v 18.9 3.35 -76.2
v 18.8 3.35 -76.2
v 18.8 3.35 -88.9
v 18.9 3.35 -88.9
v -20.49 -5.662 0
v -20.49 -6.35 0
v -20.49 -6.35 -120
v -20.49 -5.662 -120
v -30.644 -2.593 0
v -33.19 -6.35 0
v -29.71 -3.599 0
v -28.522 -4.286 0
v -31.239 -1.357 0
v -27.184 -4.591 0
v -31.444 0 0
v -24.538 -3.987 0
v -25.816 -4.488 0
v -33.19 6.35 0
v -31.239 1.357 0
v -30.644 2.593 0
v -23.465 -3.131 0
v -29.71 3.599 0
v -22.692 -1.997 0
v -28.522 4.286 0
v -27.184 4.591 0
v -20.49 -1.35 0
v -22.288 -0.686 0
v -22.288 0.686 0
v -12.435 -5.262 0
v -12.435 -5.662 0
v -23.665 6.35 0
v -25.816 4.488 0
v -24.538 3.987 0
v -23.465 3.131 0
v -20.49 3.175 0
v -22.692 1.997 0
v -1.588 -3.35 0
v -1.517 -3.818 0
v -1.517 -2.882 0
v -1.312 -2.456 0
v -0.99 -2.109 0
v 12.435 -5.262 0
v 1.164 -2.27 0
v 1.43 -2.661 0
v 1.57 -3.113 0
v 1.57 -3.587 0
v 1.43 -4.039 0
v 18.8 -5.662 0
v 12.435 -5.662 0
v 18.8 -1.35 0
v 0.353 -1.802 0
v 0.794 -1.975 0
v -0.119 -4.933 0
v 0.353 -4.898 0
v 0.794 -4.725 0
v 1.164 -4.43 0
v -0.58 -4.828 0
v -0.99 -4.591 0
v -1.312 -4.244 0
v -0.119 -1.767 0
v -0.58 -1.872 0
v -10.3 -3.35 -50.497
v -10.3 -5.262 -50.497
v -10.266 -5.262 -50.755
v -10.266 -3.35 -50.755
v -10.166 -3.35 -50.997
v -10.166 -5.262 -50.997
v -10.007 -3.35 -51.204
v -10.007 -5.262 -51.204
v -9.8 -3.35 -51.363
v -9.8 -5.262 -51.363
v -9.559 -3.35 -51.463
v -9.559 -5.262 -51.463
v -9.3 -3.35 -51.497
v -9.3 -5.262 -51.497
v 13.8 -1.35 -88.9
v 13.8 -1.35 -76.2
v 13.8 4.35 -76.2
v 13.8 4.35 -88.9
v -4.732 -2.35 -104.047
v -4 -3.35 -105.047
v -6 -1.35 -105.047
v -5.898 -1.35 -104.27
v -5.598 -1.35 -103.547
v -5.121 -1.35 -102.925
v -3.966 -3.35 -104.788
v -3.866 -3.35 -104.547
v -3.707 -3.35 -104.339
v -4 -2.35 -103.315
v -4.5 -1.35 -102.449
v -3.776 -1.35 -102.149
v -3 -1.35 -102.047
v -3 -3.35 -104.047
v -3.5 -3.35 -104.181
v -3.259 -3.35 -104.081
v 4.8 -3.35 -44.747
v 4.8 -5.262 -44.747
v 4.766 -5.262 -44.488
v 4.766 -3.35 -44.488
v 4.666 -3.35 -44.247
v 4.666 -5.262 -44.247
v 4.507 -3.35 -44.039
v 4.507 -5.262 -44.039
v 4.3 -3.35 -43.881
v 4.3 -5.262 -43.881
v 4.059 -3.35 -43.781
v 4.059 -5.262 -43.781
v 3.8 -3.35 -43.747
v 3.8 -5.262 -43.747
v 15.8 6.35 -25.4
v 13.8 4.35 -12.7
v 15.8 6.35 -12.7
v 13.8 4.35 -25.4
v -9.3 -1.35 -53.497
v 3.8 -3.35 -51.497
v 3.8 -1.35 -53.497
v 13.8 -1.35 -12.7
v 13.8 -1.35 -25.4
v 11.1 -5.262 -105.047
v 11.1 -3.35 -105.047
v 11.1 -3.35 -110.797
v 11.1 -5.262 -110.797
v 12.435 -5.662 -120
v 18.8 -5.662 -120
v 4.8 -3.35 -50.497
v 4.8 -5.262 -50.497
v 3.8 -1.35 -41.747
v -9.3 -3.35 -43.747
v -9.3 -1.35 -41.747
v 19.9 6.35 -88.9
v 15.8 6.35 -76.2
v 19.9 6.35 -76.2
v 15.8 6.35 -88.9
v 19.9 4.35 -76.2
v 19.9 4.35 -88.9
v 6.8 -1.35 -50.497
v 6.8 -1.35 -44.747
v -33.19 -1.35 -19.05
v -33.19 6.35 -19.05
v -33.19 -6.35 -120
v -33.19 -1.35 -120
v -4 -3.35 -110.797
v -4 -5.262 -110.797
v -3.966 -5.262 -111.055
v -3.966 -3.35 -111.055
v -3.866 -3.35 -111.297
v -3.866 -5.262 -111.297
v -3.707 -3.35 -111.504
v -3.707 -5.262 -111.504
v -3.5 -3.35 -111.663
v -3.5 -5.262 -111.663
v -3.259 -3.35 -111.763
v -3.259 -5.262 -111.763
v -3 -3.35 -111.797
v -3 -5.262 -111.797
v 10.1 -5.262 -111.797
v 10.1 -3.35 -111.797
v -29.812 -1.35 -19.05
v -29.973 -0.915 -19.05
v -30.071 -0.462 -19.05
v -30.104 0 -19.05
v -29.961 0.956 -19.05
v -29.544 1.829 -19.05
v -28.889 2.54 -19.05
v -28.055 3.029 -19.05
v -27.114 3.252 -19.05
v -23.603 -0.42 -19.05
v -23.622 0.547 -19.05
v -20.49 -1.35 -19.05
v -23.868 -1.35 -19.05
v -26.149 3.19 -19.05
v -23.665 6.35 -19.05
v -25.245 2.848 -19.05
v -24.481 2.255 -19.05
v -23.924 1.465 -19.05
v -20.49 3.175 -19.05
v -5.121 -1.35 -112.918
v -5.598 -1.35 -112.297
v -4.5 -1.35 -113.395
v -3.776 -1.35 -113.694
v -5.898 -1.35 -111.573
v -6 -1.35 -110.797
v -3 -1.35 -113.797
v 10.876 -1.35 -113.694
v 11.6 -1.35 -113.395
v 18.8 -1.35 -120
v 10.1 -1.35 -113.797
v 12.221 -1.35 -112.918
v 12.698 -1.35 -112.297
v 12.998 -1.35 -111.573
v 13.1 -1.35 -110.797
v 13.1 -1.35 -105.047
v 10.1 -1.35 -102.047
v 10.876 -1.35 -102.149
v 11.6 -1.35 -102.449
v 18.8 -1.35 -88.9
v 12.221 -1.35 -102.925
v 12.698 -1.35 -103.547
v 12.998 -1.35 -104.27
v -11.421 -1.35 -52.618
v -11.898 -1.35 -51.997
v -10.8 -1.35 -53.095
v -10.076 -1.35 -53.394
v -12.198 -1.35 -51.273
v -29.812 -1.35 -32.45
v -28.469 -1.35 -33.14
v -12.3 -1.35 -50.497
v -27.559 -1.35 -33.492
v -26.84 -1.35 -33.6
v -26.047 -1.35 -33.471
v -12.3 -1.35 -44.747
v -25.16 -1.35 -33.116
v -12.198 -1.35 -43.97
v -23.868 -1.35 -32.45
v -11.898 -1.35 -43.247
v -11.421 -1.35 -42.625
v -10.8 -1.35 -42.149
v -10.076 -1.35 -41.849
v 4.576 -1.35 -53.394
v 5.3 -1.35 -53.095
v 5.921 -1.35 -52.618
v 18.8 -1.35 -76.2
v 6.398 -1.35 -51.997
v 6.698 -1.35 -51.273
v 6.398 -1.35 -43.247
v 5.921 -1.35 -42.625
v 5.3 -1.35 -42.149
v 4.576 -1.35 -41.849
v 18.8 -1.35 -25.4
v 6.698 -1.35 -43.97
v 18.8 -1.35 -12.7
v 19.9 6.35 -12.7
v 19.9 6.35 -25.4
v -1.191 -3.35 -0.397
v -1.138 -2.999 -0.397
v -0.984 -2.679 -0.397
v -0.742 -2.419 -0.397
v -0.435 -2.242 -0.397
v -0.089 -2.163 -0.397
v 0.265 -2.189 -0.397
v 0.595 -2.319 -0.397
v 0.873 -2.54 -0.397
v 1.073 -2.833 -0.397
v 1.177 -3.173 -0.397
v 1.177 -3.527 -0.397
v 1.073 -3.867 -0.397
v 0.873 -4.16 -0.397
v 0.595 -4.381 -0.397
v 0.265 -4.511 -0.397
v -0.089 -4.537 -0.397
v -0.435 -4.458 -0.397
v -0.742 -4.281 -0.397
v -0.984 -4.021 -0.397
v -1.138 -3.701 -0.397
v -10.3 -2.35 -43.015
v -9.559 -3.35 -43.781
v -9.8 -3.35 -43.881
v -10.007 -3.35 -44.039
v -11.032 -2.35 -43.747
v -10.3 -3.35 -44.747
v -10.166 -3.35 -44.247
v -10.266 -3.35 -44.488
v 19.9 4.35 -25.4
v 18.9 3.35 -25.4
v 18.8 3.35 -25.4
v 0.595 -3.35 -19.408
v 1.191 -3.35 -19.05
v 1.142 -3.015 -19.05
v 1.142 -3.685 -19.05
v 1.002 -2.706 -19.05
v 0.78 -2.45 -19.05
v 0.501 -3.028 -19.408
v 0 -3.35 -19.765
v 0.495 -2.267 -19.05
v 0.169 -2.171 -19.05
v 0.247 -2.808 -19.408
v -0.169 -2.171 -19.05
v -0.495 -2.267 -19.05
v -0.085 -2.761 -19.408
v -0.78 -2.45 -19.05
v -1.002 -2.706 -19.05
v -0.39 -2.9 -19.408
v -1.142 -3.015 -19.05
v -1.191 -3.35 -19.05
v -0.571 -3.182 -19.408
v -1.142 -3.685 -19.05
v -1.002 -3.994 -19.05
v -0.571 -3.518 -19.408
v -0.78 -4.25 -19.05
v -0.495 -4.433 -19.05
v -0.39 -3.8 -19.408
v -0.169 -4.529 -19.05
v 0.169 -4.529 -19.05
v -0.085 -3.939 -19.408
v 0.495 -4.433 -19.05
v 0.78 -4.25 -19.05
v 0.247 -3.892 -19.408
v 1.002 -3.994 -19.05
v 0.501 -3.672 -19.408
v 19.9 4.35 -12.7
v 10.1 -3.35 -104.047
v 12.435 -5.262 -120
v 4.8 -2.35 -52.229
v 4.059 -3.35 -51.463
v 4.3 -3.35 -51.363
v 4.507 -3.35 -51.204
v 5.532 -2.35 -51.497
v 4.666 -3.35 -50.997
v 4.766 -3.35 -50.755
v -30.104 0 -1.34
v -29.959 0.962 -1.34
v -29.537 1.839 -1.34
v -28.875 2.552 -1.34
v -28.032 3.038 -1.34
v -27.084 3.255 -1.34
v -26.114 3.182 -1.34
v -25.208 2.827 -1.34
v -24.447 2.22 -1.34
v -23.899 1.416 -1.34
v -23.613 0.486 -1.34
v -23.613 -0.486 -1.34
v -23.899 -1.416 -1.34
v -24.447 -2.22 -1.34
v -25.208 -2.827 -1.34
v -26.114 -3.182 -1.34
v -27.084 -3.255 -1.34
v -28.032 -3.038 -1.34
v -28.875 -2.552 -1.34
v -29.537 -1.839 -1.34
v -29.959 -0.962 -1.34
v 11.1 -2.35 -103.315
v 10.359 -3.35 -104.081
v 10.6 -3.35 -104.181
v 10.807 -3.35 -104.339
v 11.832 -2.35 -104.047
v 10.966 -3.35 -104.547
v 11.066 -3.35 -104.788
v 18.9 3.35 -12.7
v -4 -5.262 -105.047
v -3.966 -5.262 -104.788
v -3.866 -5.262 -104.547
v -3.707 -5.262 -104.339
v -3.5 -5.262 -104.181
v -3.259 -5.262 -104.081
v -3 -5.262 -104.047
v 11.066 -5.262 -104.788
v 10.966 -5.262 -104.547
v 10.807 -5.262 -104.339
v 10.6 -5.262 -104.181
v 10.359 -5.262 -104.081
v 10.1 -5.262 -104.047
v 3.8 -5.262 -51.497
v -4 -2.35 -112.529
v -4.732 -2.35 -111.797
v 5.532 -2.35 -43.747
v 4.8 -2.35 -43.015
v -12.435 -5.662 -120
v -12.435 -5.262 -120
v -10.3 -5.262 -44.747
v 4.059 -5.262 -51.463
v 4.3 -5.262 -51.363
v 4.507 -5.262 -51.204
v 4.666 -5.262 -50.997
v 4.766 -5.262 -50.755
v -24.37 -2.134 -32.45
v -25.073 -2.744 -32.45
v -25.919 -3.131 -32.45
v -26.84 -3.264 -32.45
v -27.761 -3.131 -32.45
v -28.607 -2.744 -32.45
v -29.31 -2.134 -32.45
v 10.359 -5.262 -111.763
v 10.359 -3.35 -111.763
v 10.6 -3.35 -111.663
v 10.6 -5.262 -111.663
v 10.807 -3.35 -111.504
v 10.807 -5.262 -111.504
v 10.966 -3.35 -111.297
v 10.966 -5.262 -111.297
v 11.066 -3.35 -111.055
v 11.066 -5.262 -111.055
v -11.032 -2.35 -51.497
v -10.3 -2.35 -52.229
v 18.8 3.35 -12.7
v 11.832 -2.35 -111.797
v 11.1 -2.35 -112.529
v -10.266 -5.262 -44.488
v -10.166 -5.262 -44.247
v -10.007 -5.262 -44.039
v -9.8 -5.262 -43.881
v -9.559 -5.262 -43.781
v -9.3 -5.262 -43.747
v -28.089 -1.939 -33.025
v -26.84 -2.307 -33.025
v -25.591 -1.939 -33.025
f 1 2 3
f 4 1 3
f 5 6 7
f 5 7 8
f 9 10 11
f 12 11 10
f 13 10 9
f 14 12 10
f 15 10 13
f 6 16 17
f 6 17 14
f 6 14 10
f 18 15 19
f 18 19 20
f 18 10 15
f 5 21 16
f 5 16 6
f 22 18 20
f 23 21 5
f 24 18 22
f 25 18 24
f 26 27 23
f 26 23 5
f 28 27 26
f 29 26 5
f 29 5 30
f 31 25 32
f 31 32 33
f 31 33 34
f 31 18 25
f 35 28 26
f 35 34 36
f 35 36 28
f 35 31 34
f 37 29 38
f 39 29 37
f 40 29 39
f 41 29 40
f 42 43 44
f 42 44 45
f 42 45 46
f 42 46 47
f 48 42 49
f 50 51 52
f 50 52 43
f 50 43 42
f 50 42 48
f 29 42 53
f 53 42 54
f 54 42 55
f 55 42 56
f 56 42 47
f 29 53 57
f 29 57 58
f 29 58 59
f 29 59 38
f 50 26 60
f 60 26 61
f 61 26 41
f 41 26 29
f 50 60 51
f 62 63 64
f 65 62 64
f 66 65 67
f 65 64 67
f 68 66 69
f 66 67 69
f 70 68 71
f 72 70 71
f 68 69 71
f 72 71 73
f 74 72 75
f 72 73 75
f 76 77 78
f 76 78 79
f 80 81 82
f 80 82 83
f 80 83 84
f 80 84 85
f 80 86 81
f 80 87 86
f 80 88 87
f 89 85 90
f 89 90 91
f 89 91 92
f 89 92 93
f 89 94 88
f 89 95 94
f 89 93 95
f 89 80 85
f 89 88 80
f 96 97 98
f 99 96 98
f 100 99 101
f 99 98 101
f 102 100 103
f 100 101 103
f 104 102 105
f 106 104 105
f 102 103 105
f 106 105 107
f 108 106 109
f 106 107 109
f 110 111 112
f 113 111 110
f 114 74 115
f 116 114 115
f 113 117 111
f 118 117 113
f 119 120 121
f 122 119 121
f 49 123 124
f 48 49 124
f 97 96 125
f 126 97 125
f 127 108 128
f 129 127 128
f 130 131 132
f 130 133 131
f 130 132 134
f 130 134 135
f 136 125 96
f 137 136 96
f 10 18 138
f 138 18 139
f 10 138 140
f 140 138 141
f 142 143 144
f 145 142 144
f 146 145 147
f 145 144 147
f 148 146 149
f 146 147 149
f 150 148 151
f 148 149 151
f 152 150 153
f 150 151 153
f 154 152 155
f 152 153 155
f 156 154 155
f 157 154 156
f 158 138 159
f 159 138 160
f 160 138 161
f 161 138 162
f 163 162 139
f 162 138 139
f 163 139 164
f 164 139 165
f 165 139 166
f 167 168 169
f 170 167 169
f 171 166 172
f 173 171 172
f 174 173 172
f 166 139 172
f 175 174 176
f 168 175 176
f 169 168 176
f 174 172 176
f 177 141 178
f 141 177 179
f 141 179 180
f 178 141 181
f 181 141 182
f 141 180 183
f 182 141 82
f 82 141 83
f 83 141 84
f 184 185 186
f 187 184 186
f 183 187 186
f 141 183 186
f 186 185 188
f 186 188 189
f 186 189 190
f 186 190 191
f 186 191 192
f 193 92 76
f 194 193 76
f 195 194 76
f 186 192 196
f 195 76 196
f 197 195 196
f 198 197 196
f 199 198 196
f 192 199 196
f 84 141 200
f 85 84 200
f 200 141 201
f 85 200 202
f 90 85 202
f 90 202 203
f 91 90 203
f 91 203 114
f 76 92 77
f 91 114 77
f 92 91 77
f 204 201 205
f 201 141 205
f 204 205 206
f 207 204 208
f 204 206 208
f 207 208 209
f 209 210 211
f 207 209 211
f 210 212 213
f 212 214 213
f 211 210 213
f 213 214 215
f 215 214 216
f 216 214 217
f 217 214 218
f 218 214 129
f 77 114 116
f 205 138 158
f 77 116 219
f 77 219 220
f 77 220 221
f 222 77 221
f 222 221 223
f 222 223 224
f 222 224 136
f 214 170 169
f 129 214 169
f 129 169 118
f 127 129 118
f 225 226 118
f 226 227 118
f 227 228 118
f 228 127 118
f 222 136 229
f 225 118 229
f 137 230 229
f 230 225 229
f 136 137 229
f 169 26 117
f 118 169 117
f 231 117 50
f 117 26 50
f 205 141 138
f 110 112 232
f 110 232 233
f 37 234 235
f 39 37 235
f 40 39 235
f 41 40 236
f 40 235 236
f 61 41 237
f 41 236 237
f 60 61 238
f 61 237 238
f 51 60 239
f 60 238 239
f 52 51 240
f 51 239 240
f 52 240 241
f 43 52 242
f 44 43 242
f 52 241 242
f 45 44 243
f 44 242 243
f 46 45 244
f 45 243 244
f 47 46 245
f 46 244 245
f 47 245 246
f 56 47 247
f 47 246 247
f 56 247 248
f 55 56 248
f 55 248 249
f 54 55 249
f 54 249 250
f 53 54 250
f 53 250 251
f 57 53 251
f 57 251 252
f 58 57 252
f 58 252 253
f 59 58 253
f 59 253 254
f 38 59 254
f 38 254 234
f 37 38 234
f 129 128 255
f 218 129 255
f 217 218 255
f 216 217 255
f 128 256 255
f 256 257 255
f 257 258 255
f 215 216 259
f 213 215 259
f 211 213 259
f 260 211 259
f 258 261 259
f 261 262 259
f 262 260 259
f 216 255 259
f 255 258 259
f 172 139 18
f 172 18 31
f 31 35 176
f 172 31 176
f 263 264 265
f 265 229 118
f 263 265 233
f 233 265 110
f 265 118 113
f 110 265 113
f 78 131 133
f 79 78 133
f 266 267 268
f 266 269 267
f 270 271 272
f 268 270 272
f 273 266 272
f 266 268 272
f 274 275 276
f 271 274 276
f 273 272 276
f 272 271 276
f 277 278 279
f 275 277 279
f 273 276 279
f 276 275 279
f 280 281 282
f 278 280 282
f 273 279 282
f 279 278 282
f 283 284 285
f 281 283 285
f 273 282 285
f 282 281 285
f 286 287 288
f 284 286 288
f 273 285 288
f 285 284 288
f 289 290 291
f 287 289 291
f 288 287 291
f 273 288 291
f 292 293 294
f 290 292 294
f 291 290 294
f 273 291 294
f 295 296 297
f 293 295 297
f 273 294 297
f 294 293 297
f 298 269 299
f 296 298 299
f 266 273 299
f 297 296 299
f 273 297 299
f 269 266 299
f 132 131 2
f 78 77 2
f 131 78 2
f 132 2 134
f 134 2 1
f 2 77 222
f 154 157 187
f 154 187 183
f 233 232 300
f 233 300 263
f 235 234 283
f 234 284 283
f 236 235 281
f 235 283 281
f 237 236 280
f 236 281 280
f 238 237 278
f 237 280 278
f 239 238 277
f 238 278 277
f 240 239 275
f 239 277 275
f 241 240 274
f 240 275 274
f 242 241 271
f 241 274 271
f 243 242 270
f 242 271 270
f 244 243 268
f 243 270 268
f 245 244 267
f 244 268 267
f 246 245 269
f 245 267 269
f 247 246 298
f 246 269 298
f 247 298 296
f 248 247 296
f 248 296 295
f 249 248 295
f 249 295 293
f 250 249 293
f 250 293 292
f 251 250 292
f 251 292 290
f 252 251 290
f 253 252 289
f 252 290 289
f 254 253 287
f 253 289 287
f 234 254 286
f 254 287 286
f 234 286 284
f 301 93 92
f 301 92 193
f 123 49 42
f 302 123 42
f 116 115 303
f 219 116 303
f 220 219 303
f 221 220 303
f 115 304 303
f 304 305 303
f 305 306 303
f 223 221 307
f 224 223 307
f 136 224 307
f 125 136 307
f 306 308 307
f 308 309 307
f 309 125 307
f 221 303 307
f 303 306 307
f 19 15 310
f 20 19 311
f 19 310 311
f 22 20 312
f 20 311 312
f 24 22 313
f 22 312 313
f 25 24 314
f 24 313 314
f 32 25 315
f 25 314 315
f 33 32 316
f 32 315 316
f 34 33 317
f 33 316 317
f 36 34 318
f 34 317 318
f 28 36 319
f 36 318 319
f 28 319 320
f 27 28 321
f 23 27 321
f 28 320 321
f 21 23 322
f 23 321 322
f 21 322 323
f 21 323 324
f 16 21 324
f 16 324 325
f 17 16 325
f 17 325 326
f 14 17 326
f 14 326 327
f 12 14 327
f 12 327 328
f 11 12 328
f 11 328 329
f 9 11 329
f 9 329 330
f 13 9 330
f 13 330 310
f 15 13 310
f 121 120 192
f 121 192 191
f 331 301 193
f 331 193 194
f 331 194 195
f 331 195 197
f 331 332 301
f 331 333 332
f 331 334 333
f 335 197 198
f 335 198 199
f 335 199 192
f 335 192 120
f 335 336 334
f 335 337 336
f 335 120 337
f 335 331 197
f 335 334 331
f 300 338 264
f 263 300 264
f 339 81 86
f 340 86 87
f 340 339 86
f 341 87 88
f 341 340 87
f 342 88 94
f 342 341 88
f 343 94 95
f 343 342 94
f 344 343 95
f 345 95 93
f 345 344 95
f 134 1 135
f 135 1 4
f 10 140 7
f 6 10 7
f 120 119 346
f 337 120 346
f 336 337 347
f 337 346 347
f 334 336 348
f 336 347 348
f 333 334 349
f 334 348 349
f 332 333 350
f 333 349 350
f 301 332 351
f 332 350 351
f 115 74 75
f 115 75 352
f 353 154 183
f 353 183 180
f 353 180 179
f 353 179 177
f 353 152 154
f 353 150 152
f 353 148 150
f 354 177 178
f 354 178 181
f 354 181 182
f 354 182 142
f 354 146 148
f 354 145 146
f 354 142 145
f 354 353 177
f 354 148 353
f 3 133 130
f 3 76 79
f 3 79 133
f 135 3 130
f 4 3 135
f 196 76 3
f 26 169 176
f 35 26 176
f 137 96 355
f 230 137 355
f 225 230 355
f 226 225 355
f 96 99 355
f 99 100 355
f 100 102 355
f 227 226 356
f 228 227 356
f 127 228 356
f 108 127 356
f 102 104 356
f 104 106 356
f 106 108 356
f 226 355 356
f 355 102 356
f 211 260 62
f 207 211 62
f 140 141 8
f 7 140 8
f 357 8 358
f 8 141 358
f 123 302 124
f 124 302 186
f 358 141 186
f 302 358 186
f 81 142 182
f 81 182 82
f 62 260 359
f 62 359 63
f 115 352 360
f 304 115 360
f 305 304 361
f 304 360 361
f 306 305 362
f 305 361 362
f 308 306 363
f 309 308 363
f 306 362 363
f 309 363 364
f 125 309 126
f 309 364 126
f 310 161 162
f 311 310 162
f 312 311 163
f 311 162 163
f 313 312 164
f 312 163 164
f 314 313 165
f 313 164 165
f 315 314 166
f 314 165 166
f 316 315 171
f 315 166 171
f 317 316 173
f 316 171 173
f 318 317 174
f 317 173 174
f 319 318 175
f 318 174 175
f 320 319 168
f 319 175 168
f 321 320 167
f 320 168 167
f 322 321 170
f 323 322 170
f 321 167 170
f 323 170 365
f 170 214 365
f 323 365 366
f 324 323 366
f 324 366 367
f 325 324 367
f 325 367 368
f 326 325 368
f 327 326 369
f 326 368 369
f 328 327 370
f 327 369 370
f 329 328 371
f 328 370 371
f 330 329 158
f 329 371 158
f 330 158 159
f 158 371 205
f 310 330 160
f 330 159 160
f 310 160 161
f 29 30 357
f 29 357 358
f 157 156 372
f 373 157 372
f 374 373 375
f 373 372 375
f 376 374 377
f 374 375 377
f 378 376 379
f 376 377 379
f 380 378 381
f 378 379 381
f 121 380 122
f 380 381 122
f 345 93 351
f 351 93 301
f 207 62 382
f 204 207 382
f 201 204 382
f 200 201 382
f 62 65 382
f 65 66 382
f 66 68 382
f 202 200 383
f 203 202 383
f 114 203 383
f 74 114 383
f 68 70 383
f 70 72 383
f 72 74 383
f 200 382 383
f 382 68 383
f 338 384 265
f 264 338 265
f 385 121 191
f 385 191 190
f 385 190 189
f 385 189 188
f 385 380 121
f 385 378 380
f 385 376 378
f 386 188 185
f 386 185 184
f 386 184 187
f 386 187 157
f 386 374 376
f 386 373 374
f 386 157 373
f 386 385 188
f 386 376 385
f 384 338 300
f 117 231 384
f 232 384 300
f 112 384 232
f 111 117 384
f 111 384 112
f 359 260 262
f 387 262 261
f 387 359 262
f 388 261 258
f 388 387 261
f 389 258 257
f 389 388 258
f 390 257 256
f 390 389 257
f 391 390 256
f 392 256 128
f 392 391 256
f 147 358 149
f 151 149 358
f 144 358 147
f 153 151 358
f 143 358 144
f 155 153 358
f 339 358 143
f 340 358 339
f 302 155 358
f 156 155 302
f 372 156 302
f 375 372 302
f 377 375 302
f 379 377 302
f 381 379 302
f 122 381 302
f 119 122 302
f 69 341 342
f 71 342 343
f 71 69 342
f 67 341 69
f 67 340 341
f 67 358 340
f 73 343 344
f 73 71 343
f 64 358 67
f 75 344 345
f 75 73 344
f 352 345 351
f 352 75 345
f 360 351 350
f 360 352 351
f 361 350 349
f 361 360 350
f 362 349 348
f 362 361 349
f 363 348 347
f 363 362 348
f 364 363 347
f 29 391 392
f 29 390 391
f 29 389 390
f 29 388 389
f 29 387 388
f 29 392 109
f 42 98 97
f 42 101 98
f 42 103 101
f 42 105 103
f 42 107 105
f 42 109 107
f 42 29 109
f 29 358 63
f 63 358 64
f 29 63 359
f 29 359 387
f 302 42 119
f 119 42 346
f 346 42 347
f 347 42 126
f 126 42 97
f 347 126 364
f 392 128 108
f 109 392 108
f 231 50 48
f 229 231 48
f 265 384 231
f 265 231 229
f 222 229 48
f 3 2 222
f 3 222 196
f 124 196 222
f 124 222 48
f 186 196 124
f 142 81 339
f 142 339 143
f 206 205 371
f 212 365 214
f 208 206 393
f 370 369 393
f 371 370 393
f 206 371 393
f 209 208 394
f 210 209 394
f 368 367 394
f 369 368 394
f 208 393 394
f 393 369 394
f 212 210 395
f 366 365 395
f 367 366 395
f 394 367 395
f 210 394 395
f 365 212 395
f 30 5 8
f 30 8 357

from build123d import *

# Parameters (mm, degrees)
SKETCH1_W                                 = 66.38
SKETCH1_H                                 = 120
BOSS_EXTRUDE1_DEPTH                       = 6.35
SKETCH2_W                                 = 40.98
SKETCH2_H                                 = 7.7
CUT_EXTRUDE1_DEPTH                        = 121
F_3_32_0_09375_DIAMETER_HOLE1_D           = 2.38125
F_3_32_0_09375_DIAMETER_HOLE1_DEPTH       = 19.05
F_3_32_0_09375_DIAMETER_HOLE1_CSINK_D     = 3.175
F_3_32_0_09375_DIAMETER_HOLE1_CSINK_ANGLE = 90
F_3_32_0_09375_DIAMETER_HOLE1_TIP         = 0.715399675
CUT_EXTRUDE2_DEPTH                        = 1
CUT_EXTRUDE2_DEPTH_BACK                   = 121
F_5_16_18_TAPPED_HOLE1_D                  = 6.5278
F_5_16_18_TAPPED_HOLE1_DEPTH              = 32.45
F_5_16_18_TAPPED_HOLE1_CSINK_D            = 9.2075
F_5_16_18_TAPPED_HOLE1_CSINK_ANGLE        = 90
F_5_16_18_TAPPED_HOLE1_TIP                = 1.961148974
CHAMFER1_SIZE                             = 3.175
SKETCH6_W                                 = 15.1
SKETCH6_H                                 = 7.75
CUT_EXTRUDE3_DEPTH                        = 6
FILLET1_R                                 = 1
SKETCH18_W                                = 14.39
SKETCH18_H                                = 120
CUT_EXTRUDE10_DEPTH                       = 13.7000001
SKETCH19_W                                = 5
SKETCH19_H                                = 12.7
BOSS_EXTRUDE3_DEPTH                       = 7.7
SKETCH20_W                                = 12.7
SKETCH20_H                                = 3
BOSS_EXTRUDE4_DEPTH                       = 1.1
CHAMFER3_SIZE                             = 1
CHAMFER4_SIZE                             = 2
SKETCH21_W                                = 12.7
SKETCH21_H                                = 100.95
CUT_EXTRUDE11_DEPTH                       = 7.7
SKETCH22_W                                = 24.87086649
SKETCH22_H                                = 0.4
CUT_EXTRUDE12_DEPTH                       = 121.0000001
SKETCH23_W                                = 40.98
SKETCH23_H                                = 0.68791644
CUT_EXTRUDE13_DEPTH                       = 121
CHAMFER5_SIZE                             = 2


with BuildPart() as part:
    # Sketch1 → Boss-Extrude1 (new body, symmetric)
    with BuildSketch(Plane(origin=(0, 0, 0), x_dir=(1, 0, 0), z_dir=(0, 1, 0))):
        with Locations((0, 60)):
            Rectangle(SKETCH1_W, SKETCH1_H)
    extrude(amount=BOSS_EXTRUDE1_DEPTH, both=True)

    # Sketch2 → Cut-Extrude1 (cut, through all)
    with BuildSketch(Plane.XY):
        with Locations((0, 2.5)):
            Rectangle(SKETCH2_W, SKETCH2_H)
    extrude(amount=-CUT_EXTRUDE1_DEPTH, mode=Mode.SUBTRACT)

    # 3_32 _0.09375_ Diameter Hole1
    with Locations(Plane.XY):
        with Locations((0, -3.35)):
            CounterSinkHole(F_3_32_0_09375_DIAMETER_HOLE1_D / 2, F_3_32_0_09375_DIAMETER_HOLE1_CSINK_D / 2, depth=F_3_32_0_09375_DIAMETER_HOLE1_DEPTH, counter_sink_angle=F_3_32_0_09375_DIAMETER_HOLE1_CSINK_ANGLE)
            with Locations((0, 0, -(F_3_32_0_09375_DIAMETER_HOLE1_DEPTH + F_3_32_0_09375_DIAMETER_HOLE1_TIP / 2))):  # 118° drill point
                Cone(0, F_3_32_0_09375_DIAMETER_HOLE1_D / 2, F_3_32_0_09375_DIAMETER_HOLE1_TIP, mode=Mode.SUBTRACT)

    # Sketch3 → Cut-Extrude2 (cut, two sides)
    with BuildSketch(Plane.XY) as cut_extrude2_sk:
        with BuildLine():
            Line((-140.137251951, -19.091259006), (-20.49, -6.35))
            ThreePointArc((-20.49, -6.35), (0, -5.26208356), (20.49, -6.35))
            Line((20.49, -6.35), (140.137251951, -19.091259006))
            Line((140.137251951, -19.091259006), (140.137251951, -259.738757065))
            Line((140.137251951, -259.738757065), (-140.137251951, -259.738757065))
            Line((-140.137251951, -259.738757065), (-140.137251951, -19.091259006))
        make_face()
    extrude(amount=CUT_EXTRUDE2_DEPTH, mode=Mode.SUBTRACT)
    extrude(cut_extrude2_sk.sketch, amount=-CUT_EXTRUDE2_DEPTH_BACK, mode=Mode.SUBTRACT)

    # 5_16-18 Tapped Hole1
    with Locations(Plane.XY):
        with Locations((-26.84, 0)):
            CounterSinkHole(F_5_16_18_TAPPED_HOLE1_D / 2, F_5_16_18_TAPPED_HOLE1_CSINK_D / 2, depth=F_5_16_18_TAPPED_HOLE1_DEPTH, counter_sink_angle=F_5_16_18_TAPPED_HOLE1_CSINK_ANGLE)
            with Locations((0, 0, -(F_5_16_18_TAPPED_HOLE1_DEPTH + F_5_16_18_TAPPED_HOLE1_TIP / 2))):  # 118° drill point
                Cone(0, F_5_16_18_TAPPED_HOLE1_D / 2, F_5_16_18_TAPPED_HOLE1_TIP, mode=Mode.SUBTRACT)

    # Chamfer1
    chamfer1_edges = [part.edges().sort_by_distance(p)[0] for p in [
        (-20.49, 6.35, -60),
    ]]
    chamfer(chamfer1_edges, length=CHAMFER1_SIZE)

    # Sketch6 → Cut-Extrude3 (cut, through all)
    with BuildSketch(Plane(origin=(0, -1.35, 0), x_dir=(1, 0, 0), z_dir=(0, 1, 0))):
        with Locations((3.55, 107.9216)):
            Rectangle(SKETCH6_W, SKETCH6_H)
        with Locations((-2.75, 47.6216)):
            Rectangle(SKETCH6_W, SKETCH6_H)
    extrude(amount=-CUT_EXTRUDE3_DEPTH, mode=Mode.SUBTRACT)

    # Fillet1
    fillet1_edges = [part.edges().sort_by_distance(p)[0] for p in [
        (11.1, -3.465359, -111.7966),
        (11.1, -3.465359, -104.0466),
        (-4, -3.326715824, -104.0466),
        (-4, -3.326715824, -111.7966),
        (4.8, -3.335813803, -51.4966),
        (4.8, -3.335813803, -43.7466),
        (-10.3, -3.443206194, -43.7466),
        (-10.3, -3.443206194, -51.4966),
    ]]
    fillet(fillet1_edges, radius=FILLET1_R)

    # Sketch18 → Cut-Extrude10 (cut, through all)
    with BuildSketch(Plane(origin=(0, 6.35, 0), x_dir=(1, 0, 0), z_dir=(0, 1, 0))):
        with Locations((25.995, 60)):
            Rectangle(SKETCH18_W, SKETCH18_H)
    extrude(amount=-CUT_EXTRUDE10_DEPTH, mode=Mode.SUBTRACT)

    # Sketch19 → Boss-Extrude3 (add)
    with BuildSketch(Plane(origin=(0, -1.35, 0), x_dir=(1, 0, 0), z_dir=(0, 1, 0))):
        with Locations((16.3, 19.05)):
            Rectangle(SKETCH19_W, SKETCH19_H)
        with Locations((16.3, 82.55)):
            Rectangle(SKETCH19_W, SKETCH19_H)
    extrude(amount=BOSS_EXTRUDE3_DEPTH)

    # Sketch20 → Boss-Extrude4 (add)
    with BuildSketch(Plane(origin=(18.8, 0, 0), x_dir=(0, 0, -1), z_dir=(1, 0, 0))):
        with Locations((19.05, 4.85)):
            Rectangle(SKETCH20_W, SKETCH20_H)
        with Locations((82.55, 4.85)):
            Rectangle(SKETCH20_W, SKETCH20_H)
    extrude(amount=BOSS_EXTRUDE4_DEPTH)

    # Chamfer3
    chamfer3_edges = [part.edges().sort_by_distance(p)[0] for p in [
        (19.9, 3.35, -82.55),
        (19.9, 3.35, -19.05),
    ]]
    chamfer(chamfer3_edges, length=CHAMFER3_SIZE)

    # Chamfer4
    chamfer4_edges = [part.edges().sort_by_distance(p)[0] for p in [
        (13.8, 6.35, -19.05),
        (13.8, 6.35, -82.55),
    ]]
    chamfer(chamfer4_edges, length=CHAMFER4_SIZE)

    # Sketch21 → Cut-Extrude11 (cut)
    with BuildSketch(Plane(origin=(0, 6.35, 0), x_dir=(1, 0, 0), z_dir=(0, 1, 0))):
        with Locations((-26.84, 69.525)):
            Rectangle(SKETCH21_W, SKETCH21_H)
    extrude(amount=-CUT_EXTRUDE11_DEPTH, mode=Mode.SUBTRACT)

    # Sketch22 → Cut-Extrude12 (cut, through all)
    with BuildSketch(Plane.XY):
        with Locations((0, -5.46208356)):
            Rectangle(SKETCH22_W, SKETCH22_H)
    extrude(amount=-CUT_EXTRUDE12_DEPTH, mode=Mode.SUBTRACT)

    # Sketch23 → Cut-Extrude13 (cut, through all)
    with BuildSketch(Plane.XY):
        with Locations((0, -6.00604178)):
            Rectangle(SKETCH23_W, SKETCH23_H)
    extrude(amount=-CUT_EXTRUDE13_DEPTH, mode=Mode.SUBTRACT)

    # Chamfer5
    chamfer5_edges = [part.edges().sort_by_distance(p)[0] for p in [
        (-2.75, -1.35, -51.4966),
        (4.8, -1.35, -47.6216),
        (-2.75, -1.35, -43.7466),
        (-10.3, -1.35, -47.6216),
        (-3.707106781, -1.35, -104.339493219),
        (10.807106781, -1.35, -104.339493219),
        (10.807106781, -1.35, -111.503706781),
        (4.507106781, -1.35, -51.203706781),
        (4.507106781, -1.35, -44.039493219),
        (-10.007106781, -1.35, -44.039493219),
        (-10.007106781, -1.35, -51.203706781),
        (-3.707106781, -1.35, -111.503706781),
        (3.55, -1.35, -104.0466),
        (-4, -1.35, -107.9216),
        (11.1, -1.35, -107.9216),
        (3.55, -1.35, -111.7966),
    ]]
    chamfer(chamfer5_edges, length=CHAMFER5_SIZE)


solid = part.part
